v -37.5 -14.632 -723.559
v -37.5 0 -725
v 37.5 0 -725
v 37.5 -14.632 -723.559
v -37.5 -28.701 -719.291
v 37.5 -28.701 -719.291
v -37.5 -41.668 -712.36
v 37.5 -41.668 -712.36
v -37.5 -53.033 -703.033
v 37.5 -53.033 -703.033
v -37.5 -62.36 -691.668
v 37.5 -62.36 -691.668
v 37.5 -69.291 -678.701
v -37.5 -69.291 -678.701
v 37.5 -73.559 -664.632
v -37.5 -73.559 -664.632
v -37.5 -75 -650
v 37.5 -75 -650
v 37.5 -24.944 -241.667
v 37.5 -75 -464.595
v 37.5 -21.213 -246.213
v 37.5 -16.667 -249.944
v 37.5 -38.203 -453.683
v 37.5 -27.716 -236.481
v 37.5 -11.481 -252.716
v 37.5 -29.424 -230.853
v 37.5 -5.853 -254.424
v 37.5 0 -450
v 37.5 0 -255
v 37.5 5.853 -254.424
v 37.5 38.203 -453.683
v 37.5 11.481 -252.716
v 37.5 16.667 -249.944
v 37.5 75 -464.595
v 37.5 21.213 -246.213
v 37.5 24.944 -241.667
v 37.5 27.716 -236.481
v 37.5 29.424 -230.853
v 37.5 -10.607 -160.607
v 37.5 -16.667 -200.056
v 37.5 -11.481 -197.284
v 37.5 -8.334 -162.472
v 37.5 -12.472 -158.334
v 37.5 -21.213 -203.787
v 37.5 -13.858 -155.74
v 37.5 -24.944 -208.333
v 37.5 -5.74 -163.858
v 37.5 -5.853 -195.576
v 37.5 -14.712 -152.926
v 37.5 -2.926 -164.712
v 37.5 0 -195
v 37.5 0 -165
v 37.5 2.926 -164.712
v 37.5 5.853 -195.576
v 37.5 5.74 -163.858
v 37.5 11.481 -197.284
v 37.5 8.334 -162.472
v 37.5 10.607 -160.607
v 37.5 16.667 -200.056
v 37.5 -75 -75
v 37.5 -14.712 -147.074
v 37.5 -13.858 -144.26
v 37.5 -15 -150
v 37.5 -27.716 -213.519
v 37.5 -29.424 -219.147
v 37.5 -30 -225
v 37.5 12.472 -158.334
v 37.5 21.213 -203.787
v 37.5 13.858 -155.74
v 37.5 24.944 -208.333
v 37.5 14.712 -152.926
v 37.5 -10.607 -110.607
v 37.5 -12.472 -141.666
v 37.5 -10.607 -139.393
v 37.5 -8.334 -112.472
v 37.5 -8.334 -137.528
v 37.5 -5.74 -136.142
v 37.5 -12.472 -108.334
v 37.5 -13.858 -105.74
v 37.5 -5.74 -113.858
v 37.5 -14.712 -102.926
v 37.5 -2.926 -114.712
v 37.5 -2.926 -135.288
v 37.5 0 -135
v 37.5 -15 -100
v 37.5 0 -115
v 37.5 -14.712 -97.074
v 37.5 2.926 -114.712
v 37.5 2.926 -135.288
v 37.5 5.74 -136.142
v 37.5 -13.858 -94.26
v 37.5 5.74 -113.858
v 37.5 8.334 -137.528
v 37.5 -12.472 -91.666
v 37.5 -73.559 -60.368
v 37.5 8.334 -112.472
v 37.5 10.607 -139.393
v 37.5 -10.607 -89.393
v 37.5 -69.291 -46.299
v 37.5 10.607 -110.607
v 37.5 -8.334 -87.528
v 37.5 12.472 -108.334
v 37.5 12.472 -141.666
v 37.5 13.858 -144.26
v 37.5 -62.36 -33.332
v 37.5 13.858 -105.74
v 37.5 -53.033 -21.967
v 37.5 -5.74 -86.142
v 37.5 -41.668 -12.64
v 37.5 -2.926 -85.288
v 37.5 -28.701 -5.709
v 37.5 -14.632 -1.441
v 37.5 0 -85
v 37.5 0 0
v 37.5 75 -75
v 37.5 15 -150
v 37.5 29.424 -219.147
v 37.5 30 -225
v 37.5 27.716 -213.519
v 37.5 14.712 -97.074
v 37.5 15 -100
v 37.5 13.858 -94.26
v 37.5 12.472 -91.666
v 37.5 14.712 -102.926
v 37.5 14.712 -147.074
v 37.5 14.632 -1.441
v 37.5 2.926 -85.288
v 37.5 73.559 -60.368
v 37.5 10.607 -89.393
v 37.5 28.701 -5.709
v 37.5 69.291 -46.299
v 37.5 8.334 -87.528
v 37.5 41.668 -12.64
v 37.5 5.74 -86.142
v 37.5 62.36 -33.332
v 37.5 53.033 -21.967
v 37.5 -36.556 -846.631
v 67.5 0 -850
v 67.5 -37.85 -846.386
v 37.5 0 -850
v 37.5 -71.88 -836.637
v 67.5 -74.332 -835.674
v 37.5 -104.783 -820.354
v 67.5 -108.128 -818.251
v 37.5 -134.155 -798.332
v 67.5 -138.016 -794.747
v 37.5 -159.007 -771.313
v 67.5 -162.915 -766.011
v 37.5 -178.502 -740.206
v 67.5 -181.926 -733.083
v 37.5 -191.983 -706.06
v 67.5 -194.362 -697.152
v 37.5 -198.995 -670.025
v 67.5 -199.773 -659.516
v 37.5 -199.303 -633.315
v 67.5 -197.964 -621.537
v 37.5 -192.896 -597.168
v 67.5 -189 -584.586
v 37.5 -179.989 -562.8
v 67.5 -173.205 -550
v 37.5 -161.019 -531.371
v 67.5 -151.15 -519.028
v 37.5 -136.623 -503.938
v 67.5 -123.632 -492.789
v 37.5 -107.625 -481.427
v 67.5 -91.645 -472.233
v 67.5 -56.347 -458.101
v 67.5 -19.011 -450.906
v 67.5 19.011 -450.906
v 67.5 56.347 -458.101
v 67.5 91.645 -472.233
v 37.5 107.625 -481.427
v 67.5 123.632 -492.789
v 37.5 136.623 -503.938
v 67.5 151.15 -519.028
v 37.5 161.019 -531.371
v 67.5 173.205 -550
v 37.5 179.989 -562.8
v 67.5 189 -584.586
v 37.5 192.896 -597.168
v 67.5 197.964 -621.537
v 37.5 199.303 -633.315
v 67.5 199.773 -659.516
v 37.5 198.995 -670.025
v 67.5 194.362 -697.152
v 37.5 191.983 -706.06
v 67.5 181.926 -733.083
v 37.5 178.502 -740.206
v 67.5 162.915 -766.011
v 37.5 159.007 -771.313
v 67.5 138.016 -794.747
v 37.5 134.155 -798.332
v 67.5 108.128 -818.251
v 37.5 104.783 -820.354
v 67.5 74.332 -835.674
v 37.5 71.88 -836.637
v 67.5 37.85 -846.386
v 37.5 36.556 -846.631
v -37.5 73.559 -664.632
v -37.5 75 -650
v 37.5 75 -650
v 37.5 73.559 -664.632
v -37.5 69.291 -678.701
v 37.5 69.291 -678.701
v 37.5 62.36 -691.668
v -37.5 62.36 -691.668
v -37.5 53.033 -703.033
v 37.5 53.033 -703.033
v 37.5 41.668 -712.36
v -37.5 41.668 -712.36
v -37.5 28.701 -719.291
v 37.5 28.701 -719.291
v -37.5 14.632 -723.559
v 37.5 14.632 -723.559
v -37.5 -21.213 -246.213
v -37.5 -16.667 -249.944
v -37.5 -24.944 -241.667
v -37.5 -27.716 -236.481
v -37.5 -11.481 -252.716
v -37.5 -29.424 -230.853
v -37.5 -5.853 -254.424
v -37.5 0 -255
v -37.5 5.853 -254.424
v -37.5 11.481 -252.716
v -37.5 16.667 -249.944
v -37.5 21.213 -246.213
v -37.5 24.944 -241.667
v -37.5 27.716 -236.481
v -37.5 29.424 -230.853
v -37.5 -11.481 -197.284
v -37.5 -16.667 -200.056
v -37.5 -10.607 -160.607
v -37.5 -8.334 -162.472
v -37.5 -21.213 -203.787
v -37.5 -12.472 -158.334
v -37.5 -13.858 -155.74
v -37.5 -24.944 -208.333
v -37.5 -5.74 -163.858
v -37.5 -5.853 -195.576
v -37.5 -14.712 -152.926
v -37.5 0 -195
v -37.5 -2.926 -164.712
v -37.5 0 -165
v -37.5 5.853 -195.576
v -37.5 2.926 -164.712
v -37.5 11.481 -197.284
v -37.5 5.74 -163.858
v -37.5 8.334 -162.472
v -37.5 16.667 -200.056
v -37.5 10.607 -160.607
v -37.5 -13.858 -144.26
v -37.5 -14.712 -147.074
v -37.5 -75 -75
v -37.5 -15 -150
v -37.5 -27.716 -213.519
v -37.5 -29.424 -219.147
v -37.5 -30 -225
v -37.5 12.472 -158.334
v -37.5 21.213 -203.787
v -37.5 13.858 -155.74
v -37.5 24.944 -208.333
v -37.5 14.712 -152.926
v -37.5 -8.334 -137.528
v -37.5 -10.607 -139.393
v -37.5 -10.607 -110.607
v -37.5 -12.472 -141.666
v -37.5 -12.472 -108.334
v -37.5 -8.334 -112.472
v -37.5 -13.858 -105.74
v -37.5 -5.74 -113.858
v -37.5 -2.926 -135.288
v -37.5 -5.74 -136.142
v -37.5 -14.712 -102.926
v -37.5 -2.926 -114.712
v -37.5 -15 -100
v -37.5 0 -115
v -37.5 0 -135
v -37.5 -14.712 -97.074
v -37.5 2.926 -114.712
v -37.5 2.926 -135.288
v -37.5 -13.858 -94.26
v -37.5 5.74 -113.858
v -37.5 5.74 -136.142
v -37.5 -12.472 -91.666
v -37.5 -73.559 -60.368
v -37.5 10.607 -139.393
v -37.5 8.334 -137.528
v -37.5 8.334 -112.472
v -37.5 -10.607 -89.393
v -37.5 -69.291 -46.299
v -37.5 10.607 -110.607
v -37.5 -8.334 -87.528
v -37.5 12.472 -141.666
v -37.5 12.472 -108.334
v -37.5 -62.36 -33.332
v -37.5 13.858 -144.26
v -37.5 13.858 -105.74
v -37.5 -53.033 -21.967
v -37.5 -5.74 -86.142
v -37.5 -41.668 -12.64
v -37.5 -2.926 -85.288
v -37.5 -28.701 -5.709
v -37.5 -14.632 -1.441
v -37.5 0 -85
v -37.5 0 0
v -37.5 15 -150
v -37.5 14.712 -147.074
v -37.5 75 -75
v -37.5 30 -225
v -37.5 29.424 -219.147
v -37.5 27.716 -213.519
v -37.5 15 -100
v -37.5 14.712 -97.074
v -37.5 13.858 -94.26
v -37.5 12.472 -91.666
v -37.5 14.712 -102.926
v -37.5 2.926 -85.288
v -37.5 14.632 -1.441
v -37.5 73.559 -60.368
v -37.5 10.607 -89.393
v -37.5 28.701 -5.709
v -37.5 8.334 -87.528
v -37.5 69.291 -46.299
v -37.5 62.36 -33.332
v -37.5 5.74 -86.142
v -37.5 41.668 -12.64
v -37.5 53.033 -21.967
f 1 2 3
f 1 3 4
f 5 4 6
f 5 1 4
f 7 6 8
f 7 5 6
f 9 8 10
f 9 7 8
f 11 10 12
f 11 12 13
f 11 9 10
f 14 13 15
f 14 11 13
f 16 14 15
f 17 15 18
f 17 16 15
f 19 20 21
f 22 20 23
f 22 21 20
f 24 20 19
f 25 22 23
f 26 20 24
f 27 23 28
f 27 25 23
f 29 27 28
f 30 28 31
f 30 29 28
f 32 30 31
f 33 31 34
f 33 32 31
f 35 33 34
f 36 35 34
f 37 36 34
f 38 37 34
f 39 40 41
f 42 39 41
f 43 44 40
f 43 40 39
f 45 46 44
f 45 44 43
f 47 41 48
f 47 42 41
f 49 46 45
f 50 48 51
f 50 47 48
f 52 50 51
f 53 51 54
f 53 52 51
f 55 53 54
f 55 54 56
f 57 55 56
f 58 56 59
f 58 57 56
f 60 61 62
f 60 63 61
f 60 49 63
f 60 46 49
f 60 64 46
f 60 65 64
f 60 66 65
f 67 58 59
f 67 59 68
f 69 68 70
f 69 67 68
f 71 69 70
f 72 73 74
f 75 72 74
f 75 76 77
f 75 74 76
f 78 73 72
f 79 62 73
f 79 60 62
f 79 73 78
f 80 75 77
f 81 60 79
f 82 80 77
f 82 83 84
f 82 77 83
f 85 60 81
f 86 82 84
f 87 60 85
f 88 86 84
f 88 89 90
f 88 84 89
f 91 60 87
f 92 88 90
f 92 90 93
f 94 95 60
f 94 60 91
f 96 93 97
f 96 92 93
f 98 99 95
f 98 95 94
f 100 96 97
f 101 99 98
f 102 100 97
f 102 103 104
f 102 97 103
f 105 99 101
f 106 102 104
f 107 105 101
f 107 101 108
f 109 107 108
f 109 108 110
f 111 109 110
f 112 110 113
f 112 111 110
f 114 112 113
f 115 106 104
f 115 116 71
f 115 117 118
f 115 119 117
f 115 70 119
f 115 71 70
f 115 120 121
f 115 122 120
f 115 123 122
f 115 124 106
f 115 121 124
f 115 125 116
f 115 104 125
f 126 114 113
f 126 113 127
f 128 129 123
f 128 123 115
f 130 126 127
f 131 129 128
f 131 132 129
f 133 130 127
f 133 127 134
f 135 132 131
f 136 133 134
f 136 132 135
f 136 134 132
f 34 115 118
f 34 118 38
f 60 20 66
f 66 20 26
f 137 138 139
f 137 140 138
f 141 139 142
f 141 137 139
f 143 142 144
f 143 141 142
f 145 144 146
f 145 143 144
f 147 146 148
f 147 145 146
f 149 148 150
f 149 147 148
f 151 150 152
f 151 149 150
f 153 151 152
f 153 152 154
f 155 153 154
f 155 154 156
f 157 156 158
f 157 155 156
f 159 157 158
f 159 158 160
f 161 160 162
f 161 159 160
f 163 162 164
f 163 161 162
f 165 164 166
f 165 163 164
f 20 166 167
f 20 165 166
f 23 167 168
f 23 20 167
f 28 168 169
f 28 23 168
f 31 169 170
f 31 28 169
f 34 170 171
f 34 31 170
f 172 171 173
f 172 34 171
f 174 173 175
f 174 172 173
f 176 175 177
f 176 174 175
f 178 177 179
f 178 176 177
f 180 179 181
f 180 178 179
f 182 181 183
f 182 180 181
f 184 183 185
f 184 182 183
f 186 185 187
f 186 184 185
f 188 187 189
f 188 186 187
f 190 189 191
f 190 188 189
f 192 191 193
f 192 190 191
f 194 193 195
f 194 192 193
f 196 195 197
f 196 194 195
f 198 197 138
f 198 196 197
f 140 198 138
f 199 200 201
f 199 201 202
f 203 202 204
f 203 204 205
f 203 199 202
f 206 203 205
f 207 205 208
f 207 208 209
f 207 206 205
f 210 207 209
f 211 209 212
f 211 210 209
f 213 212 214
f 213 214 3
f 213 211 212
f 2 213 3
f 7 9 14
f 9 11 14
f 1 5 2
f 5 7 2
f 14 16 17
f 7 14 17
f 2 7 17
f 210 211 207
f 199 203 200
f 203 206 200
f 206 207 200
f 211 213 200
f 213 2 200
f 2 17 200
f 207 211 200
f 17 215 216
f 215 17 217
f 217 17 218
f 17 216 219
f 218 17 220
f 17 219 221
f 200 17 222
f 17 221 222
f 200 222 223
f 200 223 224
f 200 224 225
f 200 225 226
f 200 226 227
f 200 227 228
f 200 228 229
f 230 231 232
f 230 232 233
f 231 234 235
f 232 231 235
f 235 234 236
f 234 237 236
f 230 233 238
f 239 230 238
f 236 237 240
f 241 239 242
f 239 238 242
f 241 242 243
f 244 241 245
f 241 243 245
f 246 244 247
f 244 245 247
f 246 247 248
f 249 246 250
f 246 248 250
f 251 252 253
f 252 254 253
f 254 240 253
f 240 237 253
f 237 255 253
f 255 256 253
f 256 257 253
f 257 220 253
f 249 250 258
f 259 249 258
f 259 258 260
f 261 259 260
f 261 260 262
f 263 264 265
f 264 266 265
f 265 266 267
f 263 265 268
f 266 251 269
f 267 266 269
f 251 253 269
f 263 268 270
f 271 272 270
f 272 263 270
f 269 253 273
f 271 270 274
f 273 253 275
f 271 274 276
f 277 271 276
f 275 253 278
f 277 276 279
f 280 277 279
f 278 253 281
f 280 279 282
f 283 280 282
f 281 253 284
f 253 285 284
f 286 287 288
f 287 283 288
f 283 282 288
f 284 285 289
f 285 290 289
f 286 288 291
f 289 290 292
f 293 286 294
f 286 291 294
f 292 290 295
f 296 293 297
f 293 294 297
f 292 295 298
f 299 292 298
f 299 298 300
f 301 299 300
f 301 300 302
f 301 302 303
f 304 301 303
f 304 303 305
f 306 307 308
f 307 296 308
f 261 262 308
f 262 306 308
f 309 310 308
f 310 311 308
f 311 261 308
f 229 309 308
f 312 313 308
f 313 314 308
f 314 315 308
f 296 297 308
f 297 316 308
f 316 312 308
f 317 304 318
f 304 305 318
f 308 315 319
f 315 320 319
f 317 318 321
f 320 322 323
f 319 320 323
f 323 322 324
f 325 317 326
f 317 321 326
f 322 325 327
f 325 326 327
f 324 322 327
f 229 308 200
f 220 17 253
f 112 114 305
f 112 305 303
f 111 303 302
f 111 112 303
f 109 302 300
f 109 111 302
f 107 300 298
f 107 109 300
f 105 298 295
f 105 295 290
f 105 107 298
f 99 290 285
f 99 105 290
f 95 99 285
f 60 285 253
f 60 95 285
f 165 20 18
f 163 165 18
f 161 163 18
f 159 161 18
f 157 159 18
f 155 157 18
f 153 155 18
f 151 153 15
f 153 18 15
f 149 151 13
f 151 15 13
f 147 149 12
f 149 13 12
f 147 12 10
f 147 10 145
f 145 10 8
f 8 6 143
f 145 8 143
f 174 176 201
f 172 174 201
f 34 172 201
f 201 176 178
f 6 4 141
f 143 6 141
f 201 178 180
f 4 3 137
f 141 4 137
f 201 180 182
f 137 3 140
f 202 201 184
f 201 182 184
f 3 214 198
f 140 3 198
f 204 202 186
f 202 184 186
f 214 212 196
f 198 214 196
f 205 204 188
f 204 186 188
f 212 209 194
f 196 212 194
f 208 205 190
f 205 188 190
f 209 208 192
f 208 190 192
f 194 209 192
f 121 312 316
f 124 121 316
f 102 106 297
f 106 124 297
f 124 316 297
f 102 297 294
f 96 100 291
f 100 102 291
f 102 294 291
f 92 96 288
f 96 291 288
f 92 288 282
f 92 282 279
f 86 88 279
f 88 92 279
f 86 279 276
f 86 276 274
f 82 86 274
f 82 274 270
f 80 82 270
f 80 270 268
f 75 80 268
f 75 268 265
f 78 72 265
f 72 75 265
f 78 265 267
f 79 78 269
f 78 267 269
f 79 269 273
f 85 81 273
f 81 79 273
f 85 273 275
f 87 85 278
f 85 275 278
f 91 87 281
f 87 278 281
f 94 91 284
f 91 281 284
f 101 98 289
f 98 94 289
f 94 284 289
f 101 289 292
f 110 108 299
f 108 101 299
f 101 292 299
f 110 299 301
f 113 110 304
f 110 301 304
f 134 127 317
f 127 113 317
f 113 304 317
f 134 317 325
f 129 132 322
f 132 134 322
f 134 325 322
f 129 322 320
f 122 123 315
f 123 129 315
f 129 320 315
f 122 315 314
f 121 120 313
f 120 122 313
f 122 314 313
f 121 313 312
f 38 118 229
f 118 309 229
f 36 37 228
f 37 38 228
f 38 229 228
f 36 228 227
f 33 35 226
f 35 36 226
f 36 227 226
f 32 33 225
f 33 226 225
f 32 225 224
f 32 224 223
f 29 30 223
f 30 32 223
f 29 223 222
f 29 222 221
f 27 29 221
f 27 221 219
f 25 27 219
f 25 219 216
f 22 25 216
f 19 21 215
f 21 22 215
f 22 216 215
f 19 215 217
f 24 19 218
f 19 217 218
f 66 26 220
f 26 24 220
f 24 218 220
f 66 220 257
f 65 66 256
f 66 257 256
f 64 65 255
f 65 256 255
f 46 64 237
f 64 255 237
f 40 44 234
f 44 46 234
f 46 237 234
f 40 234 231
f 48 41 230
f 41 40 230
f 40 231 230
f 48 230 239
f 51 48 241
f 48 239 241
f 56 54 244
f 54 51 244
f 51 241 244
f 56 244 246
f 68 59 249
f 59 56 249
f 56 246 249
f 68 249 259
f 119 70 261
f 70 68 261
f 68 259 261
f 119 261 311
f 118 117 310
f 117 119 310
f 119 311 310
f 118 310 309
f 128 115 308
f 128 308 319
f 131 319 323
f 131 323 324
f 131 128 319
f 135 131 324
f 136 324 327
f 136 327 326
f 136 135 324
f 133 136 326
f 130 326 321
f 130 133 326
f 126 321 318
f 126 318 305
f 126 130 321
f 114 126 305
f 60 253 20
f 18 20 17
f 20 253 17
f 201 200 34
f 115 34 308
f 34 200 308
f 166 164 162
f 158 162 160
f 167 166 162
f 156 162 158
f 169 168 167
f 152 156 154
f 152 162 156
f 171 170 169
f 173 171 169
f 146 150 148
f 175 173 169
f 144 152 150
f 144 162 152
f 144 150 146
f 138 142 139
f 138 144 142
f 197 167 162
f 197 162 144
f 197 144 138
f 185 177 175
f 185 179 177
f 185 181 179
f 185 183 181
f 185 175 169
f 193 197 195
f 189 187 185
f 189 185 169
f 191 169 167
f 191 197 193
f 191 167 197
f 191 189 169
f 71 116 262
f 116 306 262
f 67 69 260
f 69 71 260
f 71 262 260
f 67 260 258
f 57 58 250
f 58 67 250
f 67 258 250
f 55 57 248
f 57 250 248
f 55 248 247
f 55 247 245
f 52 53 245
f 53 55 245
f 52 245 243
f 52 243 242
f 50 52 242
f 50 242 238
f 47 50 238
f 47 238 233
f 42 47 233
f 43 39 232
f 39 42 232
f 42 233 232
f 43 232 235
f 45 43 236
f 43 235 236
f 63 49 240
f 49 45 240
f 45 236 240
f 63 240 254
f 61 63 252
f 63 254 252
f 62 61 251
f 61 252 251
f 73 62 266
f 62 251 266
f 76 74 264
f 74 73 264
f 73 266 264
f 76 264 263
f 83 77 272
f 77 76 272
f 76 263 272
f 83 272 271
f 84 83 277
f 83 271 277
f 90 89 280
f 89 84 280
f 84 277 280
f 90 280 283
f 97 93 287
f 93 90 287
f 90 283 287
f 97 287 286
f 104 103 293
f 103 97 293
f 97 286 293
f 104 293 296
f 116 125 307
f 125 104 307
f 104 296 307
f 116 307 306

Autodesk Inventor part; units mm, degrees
ref_plane "YZ Plane" through (0, 0, 0) normal (1, 0, 0) x (0, 1, 0)
ref_plane "XZ Plane" through (0, 0, 0) normal (0, 1, 0) x (-1, 0, 0)
ref_plane "XY Plane" through (0, 0, 0) normal (0, 0, 1) x (1, 0, 0)
sketch "草圖1" plane through (0, 0, 0) normal (1, 0, 0) x (0, 1, 0)
  line L0 (75, 0) -> (-75, 0)
  line L1 (-75, 0) -> (-75, -300)
  line L2 (-75, -300) -> (75, -300)
  line L3 (75, -300) -> (75, 0)
  circle A0 centre (0, -100) radius 15
  circle A1 centre (0, -150) radius 15
  circle A2 centre (0, -225) radius 30
  line L4 (75, -300) -> (-75, -300)
  line L5 (-75, -300) -> (-75, -725)
  line L6 (-75, -725) -> (75, -725)
  line L7 (75, -725) -> (75, -300)
  point P0 (0, 0)
  point P1 (0, 0)
  dimension "d0" = 150
  dimension "d1" = 300
  dimension "d2" = 200
  dimension "d3" = 50
  dimension "d4" = 75
  dimension "d5" = 60
  dimension "d6" = 30
  dimension "d7" = 500
extrude "擠出1" add sketch "草圖1" along normal mid plane 75
full round fillet "圓角1" first side at (-12.5, -75, -241.6667) centre faces at (12.5, -25, -725) second side at (-12.5, 75, -483.3333)
sketch "草圖2" plane through (37.5, 0, 0) normal (1, 0, 0) x (0, 0, -1)
  arc A0 (650, -75) -> (650, 75) centre (650, 0) ccw projected
  line L0 (650, 75) -> (0, 75) projected
  line L1 (0, 75) -> (0, -75) projected
  line L2 (0, -75) -> (650, -75) projected
  circle A1 centre (225, 0) radius 30 projected
  circle A2 centre (150, 0) radius 15 projected
  circle A3 centre (100, 0) radius 15 projected
  circle A4 centre (650, 0) radius 200
  point P0 (0, 0)
  dimension "d10" = 400
extrude "擠出2" add sketch "草圖2" along normal blind 30 contours L2 A4 L0 A0 | A0 L0 A4 L2
fillet "圓角2" radius 75 2 edges at (0, 75, 0) (0, -75, 0)
properties part number "震動臂"
